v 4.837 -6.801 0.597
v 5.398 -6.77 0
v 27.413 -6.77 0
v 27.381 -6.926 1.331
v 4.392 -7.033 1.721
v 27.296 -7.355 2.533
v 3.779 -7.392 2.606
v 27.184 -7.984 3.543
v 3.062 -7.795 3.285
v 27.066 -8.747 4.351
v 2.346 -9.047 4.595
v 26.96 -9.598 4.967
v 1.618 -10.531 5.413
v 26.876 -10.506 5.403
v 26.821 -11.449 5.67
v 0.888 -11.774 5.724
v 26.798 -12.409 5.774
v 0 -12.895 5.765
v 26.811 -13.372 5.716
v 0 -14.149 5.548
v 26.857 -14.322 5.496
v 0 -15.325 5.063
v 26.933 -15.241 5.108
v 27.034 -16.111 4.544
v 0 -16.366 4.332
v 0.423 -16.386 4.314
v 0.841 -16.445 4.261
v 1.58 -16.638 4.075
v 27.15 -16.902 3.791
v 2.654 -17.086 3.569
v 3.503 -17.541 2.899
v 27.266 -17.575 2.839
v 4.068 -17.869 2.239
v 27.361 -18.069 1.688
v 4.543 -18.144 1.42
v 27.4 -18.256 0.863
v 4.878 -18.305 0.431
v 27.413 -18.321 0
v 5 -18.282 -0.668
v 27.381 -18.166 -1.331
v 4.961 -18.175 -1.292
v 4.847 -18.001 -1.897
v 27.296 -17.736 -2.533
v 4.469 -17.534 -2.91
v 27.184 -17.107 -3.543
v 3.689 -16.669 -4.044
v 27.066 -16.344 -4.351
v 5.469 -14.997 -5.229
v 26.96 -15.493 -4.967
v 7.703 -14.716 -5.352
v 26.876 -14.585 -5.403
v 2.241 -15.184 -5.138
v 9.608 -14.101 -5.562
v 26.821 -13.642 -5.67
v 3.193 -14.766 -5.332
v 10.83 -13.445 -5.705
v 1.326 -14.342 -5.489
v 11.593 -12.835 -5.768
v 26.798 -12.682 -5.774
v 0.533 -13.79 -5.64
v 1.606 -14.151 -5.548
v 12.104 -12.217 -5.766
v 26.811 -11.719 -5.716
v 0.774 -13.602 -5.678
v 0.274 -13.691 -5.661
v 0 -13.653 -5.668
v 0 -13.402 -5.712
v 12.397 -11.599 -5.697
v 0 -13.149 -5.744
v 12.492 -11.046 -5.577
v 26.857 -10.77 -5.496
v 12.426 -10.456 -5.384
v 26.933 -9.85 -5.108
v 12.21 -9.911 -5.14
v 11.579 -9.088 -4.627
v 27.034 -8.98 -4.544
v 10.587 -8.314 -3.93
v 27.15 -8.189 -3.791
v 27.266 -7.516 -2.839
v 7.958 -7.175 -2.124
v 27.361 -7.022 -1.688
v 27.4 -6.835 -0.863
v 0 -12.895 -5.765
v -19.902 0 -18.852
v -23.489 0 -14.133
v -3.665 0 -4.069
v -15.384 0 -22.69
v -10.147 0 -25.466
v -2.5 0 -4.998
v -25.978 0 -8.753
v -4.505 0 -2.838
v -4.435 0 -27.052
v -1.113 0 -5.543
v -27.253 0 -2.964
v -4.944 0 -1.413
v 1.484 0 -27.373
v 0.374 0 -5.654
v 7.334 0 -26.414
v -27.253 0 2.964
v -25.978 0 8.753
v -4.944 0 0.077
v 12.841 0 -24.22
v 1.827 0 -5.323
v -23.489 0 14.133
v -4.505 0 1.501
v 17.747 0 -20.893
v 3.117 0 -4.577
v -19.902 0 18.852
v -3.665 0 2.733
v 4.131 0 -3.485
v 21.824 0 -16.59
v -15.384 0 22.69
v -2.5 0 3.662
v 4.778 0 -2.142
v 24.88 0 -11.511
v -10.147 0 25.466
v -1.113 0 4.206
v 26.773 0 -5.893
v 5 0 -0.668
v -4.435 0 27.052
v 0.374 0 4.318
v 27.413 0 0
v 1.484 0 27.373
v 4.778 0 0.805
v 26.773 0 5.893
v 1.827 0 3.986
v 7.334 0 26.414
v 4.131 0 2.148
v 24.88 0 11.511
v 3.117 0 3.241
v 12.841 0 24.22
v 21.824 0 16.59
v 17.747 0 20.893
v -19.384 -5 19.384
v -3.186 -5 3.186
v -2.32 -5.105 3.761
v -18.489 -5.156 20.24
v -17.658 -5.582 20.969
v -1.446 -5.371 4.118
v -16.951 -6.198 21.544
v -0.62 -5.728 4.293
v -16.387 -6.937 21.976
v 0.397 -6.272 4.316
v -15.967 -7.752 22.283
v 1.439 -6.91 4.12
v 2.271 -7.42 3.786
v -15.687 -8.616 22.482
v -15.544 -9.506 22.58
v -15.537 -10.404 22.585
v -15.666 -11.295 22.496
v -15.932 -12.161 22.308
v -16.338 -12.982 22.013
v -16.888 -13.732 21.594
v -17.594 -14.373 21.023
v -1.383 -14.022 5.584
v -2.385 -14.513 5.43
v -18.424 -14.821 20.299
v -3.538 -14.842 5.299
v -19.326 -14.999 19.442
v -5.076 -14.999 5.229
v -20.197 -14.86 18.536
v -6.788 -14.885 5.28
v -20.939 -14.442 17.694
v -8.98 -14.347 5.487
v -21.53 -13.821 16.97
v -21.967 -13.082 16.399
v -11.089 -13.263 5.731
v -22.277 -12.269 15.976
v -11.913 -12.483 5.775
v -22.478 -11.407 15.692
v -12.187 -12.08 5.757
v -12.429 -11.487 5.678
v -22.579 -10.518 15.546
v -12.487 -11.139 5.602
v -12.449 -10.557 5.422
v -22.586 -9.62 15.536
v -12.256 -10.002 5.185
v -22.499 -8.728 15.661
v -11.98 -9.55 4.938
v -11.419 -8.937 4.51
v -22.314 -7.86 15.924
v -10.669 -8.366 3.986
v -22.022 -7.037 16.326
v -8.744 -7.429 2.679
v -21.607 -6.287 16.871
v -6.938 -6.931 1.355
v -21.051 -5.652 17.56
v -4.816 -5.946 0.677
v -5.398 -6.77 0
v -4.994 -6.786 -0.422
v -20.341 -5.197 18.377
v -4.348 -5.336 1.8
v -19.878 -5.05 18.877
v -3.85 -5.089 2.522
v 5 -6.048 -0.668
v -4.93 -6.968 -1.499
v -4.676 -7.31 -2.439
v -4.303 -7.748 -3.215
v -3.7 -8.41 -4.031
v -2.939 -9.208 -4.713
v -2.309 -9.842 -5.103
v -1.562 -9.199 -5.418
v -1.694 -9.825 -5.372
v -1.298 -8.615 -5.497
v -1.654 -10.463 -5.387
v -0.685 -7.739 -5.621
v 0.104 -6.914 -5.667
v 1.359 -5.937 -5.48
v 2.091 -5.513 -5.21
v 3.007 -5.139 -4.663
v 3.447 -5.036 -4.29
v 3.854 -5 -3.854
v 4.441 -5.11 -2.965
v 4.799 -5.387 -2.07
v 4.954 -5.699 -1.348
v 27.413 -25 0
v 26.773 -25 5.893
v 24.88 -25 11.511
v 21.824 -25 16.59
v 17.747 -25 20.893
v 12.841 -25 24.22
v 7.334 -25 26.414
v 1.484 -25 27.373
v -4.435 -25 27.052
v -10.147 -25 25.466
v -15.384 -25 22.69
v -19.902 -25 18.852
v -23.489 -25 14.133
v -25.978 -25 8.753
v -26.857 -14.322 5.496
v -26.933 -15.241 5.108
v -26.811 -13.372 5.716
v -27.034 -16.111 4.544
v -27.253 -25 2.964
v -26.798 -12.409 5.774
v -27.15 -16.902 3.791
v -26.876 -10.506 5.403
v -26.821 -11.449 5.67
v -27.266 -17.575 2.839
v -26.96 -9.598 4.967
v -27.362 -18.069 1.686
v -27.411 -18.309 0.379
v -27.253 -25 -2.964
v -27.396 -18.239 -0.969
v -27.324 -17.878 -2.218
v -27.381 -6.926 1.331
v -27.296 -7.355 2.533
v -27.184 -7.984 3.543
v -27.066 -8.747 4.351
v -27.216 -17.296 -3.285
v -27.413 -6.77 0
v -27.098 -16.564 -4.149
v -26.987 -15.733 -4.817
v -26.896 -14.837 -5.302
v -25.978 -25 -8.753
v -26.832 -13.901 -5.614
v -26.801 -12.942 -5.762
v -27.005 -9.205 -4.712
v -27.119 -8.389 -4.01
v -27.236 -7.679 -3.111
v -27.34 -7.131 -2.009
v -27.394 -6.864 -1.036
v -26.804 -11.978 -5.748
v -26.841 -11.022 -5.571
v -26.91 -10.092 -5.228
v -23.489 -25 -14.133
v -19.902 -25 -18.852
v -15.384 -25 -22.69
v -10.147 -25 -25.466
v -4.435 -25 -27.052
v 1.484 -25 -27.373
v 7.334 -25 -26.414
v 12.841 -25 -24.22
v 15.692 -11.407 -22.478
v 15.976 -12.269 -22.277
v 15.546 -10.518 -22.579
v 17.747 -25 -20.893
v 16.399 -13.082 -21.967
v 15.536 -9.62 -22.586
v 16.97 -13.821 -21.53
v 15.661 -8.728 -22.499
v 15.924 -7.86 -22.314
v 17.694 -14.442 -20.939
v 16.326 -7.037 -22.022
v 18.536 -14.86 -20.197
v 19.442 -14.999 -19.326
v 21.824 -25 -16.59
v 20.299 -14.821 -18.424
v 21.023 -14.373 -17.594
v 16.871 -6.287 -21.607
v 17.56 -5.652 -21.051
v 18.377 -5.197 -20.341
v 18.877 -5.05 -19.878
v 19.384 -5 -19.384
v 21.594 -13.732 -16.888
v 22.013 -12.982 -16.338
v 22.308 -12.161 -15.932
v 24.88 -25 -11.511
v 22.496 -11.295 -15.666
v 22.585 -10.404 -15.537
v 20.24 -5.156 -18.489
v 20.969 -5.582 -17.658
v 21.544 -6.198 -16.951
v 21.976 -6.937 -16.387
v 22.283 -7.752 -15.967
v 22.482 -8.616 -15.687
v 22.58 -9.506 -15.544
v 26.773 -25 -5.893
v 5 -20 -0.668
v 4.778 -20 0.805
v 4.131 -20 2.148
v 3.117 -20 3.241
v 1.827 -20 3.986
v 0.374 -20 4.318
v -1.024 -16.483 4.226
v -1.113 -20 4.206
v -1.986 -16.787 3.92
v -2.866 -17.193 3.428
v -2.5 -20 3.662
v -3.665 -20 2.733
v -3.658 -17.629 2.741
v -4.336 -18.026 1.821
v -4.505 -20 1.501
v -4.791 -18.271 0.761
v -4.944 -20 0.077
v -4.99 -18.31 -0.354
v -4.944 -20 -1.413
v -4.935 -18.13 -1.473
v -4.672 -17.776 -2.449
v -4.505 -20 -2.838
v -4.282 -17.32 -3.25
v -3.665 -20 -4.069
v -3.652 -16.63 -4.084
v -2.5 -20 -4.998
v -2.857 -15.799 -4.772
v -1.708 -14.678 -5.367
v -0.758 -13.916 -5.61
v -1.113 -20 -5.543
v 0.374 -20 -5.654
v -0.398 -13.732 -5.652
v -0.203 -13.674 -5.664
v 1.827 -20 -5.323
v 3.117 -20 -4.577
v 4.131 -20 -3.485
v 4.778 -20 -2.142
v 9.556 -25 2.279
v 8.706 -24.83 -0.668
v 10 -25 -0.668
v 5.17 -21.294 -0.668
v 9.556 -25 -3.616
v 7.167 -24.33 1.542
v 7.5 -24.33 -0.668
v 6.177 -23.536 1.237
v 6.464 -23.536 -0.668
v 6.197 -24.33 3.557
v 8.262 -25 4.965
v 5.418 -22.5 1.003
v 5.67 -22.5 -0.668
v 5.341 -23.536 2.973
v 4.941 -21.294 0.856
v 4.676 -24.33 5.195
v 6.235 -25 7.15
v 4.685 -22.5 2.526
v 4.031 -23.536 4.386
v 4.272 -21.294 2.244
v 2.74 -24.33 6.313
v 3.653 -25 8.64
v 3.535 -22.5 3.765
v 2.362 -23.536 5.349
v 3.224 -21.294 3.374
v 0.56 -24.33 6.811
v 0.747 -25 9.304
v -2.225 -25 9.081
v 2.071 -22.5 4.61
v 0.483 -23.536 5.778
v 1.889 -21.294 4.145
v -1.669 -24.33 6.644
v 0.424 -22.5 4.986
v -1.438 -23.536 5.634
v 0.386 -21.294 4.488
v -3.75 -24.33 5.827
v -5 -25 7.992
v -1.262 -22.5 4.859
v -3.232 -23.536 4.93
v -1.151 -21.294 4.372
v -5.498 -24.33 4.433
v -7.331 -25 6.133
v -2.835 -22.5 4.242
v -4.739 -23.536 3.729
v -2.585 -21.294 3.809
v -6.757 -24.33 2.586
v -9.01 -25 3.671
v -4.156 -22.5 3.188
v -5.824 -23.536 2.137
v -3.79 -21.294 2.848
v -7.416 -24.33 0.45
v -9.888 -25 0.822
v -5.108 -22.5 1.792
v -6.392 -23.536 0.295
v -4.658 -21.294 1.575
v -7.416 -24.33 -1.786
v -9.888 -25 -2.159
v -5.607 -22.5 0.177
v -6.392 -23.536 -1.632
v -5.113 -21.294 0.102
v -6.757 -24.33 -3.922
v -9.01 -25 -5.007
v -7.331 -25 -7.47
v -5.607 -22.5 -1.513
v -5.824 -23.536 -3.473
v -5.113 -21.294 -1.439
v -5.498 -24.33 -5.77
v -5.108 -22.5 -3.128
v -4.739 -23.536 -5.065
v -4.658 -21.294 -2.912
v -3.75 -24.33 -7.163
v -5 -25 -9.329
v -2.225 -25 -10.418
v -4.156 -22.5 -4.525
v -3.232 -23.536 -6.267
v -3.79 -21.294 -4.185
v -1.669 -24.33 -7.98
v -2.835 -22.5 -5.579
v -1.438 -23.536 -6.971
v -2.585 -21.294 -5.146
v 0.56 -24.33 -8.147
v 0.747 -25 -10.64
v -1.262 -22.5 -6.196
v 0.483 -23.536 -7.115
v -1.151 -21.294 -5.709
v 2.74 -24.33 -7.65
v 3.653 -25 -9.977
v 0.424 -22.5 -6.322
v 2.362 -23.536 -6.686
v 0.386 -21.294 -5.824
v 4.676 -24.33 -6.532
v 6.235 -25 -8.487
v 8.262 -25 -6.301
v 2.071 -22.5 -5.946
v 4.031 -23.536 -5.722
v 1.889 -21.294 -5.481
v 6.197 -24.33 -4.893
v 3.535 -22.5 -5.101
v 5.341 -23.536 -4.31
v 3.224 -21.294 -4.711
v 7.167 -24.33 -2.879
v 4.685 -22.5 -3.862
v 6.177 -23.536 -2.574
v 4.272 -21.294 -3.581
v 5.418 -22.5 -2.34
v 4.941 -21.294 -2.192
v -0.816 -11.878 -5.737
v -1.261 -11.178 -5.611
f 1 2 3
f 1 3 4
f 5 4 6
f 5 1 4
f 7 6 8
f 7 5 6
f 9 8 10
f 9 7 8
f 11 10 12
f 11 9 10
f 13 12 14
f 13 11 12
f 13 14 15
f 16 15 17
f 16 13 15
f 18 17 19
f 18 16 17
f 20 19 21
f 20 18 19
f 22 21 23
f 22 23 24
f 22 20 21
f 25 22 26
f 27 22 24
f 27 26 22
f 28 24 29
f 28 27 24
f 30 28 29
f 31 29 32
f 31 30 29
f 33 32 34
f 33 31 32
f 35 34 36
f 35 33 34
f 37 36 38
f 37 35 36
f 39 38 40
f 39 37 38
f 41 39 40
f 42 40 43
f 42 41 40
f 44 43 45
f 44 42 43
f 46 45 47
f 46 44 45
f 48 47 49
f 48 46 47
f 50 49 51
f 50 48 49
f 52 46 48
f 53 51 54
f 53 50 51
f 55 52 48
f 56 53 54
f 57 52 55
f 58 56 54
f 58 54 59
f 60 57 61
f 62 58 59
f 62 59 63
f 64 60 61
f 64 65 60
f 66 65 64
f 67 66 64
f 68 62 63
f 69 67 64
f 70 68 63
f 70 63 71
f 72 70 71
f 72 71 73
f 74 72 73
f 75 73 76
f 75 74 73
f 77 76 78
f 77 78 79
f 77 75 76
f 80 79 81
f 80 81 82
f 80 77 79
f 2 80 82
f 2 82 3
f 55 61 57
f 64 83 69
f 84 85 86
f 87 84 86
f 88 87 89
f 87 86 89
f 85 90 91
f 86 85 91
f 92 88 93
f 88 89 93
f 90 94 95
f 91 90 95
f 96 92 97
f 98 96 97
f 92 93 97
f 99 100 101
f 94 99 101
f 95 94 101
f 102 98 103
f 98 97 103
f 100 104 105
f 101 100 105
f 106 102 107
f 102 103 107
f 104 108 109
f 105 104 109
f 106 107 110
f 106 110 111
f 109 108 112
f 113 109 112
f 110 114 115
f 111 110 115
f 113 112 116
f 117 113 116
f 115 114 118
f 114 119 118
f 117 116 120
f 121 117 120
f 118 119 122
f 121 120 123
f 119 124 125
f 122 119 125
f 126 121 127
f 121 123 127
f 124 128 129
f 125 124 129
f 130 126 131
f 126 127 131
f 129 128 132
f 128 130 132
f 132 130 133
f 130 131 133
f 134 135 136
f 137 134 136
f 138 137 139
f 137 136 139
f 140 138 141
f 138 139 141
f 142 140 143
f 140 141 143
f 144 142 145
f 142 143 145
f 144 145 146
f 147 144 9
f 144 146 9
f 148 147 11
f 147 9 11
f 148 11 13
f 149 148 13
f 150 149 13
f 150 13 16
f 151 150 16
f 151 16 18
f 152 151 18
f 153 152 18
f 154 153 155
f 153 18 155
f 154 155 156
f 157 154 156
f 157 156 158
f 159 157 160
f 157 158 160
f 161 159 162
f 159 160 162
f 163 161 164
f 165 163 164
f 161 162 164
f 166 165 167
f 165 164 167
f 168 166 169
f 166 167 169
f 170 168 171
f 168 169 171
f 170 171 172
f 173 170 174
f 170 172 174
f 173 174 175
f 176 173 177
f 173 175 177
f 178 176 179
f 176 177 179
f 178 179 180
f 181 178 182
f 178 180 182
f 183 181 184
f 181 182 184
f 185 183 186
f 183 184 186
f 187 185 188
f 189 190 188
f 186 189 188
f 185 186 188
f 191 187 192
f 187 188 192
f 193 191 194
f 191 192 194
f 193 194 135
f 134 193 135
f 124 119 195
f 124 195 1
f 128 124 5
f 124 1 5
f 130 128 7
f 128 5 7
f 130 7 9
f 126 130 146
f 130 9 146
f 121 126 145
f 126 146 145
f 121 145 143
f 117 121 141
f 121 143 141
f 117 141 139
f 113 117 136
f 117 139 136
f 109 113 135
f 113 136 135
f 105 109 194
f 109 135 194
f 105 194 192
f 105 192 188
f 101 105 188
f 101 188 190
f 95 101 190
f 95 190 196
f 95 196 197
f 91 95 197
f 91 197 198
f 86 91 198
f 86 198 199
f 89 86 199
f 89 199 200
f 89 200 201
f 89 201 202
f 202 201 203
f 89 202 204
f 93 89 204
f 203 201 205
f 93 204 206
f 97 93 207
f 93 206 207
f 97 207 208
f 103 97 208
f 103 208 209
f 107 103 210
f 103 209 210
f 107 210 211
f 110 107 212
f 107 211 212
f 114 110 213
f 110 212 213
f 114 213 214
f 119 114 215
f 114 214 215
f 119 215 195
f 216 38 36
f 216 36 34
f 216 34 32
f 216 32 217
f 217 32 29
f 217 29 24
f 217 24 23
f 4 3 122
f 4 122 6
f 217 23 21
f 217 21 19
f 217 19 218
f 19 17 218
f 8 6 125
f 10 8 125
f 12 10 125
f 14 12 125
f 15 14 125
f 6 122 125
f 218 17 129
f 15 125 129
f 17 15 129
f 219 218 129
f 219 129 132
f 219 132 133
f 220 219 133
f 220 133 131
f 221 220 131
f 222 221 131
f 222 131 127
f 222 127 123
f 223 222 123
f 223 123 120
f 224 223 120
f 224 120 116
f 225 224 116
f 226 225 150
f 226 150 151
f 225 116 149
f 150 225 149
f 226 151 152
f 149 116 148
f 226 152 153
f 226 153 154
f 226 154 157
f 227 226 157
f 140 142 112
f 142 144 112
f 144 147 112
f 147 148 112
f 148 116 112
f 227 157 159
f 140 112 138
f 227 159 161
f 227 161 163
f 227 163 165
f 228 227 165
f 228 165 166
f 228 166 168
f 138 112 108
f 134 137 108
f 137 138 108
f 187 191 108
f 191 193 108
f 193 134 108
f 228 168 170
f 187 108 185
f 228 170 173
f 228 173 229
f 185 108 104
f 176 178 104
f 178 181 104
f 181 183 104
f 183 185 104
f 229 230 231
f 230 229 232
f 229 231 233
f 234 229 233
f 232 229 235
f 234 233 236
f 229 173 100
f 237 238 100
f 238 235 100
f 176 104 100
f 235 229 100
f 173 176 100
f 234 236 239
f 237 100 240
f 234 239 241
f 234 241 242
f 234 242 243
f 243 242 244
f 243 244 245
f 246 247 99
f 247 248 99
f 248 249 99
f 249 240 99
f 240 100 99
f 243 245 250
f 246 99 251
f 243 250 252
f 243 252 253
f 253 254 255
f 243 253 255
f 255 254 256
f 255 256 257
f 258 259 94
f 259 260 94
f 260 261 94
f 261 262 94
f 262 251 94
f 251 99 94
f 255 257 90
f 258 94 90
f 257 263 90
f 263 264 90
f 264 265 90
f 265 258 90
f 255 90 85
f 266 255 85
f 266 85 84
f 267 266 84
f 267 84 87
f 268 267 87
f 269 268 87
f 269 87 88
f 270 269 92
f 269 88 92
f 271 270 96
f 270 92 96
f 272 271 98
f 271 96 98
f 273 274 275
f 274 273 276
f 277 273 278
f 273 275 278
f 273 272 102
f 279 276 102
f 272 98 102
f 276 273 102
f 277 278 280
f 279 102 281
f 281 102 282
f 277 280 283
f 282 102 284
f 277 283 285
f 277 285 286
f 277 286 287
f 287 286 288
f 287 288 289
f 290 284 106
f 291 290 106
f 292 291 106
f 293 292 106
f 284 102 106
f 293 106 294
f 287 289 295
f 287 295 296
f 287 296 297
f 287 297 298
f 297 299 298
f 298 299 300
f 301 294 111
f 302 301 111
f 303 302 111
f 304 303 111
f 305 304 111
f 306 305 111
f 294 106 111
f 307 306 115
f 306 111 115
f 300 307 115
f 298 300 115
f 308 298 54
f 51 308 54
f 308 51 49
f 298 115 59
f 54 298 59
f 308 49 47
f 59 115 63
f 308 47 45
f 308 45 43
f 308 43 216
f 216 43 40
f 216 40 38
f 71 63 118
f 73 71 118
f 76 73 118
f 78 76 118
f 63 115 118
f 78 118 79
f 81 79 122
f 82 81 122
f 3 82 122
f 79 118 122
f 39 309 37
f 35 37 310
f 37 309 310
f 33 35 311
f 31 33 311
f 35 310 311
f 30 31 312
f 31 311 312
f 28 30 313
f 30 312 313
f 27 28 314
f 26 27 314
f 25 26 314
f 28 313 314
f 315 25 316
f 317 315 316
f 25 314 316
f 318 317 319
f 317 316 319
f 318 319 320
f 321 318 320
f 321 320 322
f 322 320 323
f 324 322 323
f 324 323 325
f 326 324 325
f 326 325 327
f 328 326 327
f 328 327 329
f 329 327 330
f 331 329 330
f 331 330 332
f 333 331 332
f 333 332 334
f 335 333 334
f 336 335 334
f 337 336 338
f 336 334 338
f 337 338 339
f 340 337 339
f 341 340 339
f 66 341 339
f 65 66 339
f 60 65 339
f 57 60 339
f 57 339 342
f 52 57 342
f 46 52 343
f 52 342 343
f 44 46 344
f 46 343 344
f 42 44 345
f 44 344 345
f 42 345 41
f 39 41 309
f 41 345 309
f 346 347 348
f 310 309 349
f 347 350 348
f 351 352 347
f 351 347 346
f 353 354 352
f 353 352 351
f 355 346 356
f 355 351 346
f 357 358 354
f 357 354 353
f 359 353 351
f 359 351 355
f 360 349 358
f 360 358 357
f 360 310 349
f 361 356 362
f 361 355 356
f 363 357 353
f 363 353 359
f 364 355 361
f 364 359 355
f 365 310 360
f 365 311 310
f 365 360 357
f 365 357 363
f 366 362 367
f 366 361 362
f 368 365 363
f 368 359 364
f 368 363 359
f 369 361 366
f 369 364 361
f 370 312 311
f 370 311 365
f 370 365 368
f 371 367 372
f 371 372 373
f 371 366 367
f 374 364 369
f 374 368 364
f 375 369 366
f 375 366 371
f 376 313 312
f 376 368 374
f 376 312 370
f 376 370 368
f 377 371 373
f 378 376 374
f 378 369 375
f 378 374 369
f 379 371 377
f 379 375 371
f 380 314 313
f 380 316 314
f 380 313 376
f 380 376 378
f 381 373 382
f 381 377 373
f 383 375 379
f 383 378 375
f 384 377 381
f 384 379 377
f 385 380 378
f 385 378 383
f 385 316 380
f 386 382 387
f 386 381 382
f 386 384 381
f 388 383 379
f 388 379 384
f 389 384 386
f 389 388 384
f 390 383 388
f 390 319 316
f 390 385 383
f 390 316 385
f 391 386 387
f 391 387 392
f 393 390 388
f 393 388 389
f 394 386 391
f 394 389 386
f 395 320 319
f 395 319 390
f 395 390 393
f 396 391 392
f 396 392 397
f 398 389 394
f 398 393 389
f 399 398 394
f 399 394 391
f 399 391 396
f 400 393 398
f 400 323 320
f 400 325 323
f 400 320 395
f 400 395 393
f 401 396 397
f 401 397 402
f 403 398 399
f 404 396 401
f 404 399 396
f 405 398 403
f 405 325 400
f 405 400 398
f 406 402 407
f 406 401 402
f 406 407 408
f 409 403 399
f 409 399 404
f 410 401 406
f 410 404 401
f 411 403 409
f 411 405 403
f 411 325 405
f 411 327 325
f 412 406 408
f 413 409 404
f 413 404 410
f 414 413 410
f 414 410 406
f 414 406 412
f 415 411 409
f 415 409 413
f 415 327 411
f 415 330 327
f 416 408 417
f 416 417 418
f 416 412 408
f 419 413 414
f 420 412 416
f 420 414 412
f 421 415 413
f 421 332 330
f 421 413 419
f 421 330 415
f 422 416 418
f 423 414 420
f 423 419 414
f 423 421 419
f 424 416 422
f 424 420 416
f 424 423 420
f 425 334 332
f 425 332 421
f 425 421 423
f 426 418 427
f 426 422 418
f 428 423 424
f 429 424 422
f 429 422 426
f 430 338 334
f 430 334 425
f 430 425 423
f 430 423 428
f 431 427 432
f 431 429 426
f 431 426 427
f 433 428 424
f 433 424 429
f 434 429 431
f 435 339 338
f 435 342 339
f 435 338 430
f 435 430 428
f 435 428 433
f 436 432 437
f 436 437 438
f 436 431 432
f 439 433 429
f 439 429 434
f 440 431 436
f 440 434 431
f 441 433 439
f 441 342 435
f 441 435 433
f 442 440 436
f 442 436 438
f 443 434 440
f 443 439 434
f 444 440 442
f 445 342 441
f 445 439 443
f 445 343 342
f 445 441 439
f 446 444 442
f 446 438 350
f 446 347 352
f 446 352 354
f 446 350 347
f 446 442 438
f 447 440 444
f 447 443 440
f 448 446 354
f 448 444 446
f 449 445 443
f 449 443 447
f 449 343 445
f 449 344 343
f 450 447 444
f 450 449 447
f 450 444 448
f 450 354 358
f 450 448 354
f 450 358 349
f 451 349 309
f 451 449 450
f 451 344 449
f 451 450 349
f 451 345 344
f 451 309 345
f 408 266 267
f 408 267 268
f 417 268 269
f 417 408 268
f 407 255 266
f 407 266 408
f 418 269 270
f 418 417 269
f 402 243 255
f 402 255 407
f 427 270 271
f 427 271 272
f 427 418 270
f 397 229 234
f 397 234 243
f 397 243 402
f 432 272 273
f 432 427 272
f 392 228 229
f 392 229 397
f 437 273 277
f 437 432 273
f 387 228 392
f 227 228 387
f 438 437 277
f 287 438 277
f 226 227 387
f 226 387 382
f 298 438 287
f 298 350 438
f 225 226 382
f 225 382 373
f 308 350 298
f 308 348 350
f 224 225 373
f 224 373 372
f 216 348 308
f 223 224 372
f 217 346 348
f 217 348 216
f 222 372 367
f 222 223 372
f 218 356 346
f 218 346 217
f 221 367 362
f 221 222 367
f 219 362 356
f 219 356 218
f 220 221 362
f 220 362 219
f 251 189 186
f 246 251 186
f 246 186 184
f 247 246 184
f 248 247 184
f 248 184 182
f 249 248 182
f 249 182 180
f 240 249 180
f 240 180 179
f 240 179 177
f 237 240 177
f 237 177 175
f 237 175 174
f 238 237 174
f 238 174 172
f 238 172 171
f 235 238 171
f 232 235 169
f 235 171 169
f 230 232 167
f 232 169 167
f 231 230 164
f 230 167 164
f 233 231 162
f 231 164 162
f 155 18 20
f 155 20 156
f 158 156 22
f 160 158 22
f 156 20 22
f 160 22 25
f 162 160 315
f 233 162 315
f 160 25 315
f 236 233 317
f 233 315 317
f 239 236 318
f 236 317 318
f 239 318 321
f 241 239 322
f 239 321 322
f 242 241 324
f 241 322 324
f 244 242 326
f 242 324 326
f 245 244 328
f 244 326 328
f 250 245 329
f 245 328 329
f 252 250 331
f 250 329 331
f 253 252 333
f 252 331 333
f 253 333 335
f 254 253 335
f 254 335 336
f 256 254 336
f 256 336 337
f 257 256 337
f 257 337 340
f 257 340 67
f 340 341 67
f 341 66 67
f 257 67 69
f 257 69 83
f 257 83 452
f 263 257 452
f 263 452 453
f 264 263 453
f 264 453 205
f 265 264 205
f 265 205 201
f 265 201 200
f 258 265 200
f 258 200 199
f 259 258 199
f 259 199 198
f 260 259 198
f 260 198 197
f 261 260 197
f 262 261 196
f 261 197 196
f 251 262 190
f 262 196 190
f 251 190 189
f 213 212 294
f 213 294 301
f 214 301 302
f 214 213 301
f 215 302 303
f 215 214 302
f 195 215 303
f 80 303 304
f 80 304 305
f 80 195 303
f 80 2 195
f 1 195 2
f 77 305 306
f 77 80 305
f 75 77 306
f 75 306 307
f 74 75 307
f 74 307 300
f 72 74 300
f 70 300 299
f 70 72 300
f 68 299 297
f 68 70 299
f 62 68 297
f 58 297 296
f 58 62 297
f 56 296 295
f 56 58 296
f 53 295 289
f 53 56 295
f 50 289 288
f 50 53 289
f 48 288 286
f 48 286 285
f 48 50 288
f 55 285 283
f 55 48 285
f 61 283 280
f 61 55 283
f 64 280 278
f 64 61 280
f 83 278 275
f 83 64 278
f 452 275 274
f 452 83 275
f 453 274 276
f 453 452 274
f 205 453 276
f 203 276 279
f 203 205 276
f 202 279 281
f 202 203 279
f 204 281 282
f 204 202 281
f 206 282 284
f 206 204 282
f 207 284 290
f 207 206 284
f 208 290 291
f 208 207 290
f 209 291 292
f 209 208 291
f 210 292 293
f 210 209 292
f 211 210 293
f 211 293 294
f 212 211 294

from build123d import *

# Parameters (mm, degrees)
F0_R           = 27.4134107223
F1_DEPTH       = 25
F2_R           = 5
F3_DEPTH       = 25
F3_DEPTH_BACK  = 25
F4_R           = 5
F5_R           = 5.7754961782
F6_DEPTH       = 27.4144107223
F6_DEPTH_BACK  = 27.4144107223
F9_R           = 5
F10_DEPTH      = 38.7694173758
F10_DEPTH_BACK = 38.7694173758


with BuildPart() as f1:
    # F0 (on Front) → F1 (new body)
    with BuildSketch(Plane.XZ):
        Circle(F0_R)
    extrude(amount=F1_DEPTH)

    # F2 (on face) → F3 (cut, two sides)
    with BuildSketch(Plane.XZ.offset(25)) as f3_sk:
        with Locations((0, -0.6682850071)):
            Circle(F2_R)
    extrude(amount=-F3_DEPTH, mode=Mode.SUBTRACT)
    extrude(f3_sk.sketch, amount=F3_DEPTH_BACK, mode=Mode.SUBTRACT)

    # F4
    f4_edges = [f1.edges().sort_by_distance(p)[0] for p in [
        (-5, -25, -0.668285),
    ]]
    fillet(f4_edges, radius=F4_R)

    # F5 (on Right) → F6 (cut, two sides)
    with BuildSketch(Plane.YZ) as f6_sk:
        with Locations((-12.5455856323, 0)):
            Circle(F5_R)
    extrude(amount=F6_DEPTH, mode=Mode.SUBTRACT)
    extrude(f6_sk.sketch, amount=-F6_DEPTH_BACK, mode=Mode.SUBTRACT)

    # F9 (on face) → F10 (cut, two sides)
    with BuildSketch(Plane(origin=(0, 0, 0), x_dir=(0, 1, 0), z_dir=(0.7071067812, 0, -0.7071067812))) as f10_sk:
        with Locations((-10, 0)):
            Circle(F9_R)
    extrude(amount=-F10_DEPTH, mode=Mode.SUBTRACT)
    extrude(f10_sk.sketch, amount=F10_DEPTH_BACK, mode=Mode.SUBTRACT)


solid = f1.part
